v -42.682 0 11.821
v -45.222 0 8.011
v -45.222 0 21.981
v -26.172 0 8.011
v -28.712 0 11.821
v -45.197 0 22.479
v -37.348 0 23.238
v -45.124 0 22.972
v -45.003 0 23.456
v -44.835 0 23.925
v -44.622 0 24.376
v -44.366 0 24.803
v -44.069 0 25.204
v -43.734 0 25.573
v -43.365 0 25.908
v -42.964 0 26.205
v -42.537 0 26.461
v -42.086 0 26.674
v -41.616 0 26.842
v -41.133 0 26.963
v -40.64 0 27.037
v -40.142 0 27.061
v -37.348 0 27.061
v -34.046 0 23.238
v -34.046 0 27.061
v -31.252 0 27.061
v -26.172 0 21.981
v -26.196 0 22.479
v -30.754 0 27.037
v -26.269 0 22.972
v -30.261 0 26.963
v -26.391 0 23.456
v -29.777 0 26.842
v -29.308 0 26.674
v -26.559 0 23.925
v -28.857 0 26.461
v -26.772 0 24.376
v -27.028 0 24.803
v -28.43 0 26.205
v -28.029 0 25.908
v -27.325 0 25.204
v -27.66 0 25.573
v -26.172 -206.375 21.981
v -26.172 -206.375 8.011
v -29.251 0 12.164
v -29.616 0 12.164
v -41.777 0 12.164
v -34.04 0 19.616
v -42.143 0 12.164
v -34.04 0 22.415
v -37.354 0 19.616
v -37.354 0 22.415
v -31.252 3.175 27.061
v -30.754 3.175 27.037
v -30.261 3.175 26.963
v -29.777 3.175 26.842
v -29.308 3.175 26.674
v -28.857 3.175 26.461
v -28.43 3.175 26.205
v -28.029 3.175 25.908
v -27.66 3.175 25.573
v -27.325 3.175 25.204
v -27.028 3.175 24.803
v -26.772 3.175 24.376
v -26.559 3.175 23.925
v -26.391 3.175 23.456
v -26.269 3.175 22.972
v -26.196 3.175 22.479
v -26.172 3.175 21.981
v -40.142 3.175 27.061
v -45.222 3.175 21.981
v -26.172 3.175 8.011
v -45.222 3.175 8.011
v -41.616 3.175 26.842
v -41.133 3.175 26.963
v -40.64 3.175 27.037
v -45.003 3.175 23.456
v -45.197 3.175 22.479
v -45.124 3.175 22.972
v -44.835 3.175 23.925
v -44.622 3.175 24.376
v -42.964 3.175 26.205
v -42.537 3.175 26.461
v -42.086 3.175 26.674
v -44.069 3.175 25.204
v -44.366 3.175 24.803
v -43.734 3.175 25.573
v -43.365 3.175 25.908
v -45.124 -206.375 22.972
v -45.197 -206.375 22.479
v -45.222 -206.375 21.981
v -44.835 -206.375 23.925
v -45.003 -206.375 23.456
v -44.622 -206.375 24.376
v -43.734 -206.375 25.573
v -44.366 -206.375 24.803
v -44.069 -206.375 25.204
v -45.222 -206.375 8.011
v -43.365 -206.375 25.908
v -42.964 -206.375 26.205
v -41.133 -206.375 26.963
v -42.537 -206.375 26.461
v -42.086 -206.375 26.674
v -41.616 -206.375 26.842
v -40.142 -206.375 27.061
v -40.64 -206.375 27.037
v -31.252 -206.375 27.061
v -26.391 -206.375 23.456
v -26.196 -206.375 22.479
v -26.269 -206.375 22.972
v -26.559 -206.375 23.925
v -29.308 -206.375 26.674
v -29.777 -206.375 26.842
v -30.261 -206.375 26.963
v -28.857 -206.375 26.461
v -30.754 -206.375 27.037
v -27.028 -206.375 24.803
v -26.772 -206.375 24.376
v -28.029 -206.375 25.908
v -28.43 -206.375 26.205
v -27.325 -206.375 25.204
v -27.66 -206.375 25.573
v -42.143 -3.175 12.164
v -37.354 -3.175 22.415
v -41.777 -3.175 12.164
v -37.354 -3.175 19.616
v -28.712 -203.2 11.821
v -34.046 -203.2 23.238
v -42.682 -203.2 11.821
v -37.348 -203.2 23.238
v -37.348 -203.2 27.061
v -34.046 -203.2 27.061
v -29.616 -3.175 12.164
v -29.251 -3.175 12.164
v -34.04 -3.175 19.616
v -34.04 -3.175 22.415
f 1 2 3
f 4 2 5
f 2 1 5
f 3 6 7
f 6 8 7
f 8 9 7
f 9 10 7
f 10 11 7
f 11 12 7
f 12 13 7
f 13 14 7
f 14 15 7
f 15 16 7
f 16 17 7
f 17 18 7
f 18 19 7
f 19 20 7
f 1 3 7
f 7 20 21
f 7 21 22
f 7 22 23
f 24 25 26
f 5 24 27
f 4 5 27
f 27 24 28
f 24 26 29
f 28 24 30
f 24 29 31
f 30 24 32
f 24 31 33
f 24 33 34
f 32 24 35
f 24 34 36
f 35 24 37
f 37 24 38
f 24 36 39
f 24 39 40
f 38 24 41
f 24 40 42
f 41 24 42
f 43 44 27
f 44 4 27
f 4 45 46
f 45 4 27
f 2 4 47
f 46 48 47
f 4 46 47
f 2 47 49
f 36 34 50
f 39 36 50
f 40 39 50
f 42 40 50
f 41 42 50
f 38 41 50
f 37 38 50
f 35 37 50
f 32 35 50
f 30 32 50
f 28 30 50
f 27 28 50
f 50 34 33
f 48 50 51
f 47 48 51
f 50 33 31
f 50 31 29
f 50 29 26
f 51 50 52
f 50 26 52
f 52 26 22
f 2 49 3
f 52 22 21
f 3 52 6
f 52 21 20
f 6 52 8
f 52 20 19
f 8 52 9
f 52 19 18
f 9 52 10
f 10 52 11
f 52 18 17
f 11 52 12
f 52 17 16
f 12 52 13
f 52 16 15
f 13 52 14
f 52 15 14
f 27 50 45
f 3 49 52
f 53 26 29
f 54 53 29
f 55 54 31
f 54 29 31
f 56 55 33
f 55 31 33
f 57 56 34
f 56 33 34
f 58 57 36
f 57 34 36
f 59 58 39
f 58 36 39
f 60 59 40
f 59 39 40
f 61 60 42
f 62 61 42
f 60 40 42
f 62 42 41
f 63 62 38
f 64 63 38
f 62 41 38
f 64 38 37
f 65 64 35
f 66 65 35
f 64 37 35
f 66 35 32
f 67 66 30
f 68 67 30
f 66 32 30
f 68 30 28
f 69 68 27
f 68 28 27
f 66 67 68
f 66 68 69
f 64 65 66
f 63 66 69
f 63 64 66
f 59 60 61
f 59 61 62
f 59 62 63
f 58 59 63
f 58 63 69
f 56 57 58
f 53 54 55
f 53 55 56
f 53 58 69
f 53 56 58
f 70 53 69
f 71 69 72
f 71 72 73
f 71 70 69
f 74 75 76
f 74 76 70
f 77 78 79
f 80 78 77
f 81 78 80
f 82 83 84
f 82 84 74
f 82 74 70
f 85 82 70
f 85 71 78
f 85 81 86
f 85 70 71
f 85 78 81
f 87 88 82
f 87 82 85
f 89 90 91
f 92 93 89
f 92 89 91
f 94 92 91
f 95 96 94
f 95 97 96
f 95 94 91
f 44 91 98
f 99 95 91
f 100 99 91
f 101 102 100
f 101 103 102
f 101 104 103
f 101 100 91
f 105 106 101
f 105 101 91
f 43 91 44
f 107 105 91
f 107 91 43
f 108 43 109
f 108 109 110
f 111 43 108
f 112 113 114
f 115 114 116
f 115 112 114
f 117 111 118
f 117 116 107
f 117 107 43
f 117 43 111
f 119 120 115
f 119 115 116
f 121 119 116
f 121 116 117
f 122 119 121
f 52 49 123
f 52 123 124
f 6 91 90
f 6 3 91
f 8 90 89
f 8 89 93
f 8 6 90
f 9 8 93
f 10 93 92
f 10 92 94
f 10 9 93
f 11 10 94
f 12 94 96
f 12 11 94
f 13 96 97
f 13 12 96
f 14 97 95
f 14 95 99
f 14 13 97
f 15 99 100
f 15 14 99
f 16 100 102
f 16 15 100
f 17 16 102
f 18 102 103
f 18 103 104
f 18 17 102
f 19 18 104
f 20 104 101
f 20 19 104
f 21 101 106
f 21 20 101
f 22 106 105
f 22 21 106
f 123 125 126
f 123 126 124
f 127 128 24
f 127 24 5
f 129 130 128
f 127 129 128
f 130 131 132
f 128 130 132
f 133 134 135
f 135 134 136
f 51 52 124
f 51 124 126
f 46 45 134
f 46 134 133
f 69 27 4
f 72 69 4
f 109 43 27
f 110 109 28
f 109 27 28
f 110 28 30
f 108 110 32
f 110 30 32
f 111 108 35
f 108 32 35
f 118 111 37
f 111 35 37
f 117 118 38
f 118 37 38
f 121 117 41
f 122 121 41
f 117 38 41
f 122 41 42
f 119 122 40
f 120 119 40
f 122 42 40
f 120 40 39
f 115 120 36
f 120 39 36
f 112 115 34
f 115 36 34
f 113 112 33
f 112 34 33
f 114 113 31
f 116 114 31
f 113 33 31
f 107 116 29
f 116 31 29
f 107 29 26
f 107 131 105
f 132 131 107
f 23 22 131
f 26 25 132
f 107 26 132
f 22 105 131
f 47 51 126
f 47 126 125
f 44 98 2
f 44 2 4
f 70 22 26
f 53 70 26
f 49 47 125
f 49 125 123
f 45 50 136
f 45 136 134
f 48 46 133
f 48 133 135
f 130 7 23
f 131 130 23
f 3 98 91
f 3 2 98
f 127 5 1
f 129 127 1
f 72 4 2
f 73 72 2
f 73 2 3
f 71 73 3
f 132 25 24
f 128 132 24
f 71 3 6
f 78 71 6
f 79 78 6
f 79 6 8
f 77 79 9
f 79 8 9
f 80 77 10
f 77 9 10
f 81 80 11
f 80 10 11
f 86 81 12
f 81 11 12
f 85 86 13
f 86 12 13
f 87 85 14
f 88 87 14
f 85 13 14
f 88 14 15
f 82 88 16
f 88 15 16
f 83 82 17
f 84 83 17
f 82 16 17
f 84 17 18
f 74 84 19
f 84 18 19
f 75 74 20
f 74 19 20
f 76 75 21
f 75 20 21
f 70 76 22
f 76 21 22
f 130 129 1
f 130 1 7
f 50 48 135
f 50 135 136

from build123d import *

# Parameters (mm, degrees)
F1_DEPTH = 203.2
F2_W     = 19.05
F2_H     = 19.05
F3_DEPTH = 3.175
F4_R     = 5.08
F5_W     = 3.302
F5_H     = 3.823372
F6_DEPTH = 3.175
F8_DEPTH = 6.35


with BuildPart() as f1:
    # F0 (on Front) → F1 (new body)
    with BuildSketch(Plane.XZ):
        Polygon((-37.347843, 27.060995), (-45.221843, 27.060995), (-45.221843, 8.010995), (-26.171843, 8.010995), (-26.171843, 27.060995), (-34.045843, 27.060995), (-34.045843, 23.237623), (-28.711843, 11.820995), (-42.681843, 11.820995), (-37.347843, 23.237623), align=None)
    extrude(amount=F1_DEPTH)

    # F2 (on face) → F3 (join)
    with BuildSketch(Plane.XZ.offset(203.2)):
        with Locations((-35.696843, 17.535995)):
            Rectangle(F2_W, F2_H)
    extrude(amount=F3_DEPTH)

    # F4
    f4_edges = [f1.edges().sort_by_distance(p)[0] for p in [
        (-45.221843, -103.1875, 27.060995),
        (-26.171843, -103.1875, 27.060995),
    ]]
    fillet(f4_edges, radius=F4_R)


with BuildPart() as f6:
    # F5 (on face) → F6 (new body)
    with BuildSketch(Plane(origin=(0, 0, 0), x_dir=(-1, 0, 0), z_dir=(0, 1, 0))):
        with BuildLine():
            Line((42.681843, 11.820995), (28.711843, 11.820995))
            Line((28.711843, 11.820995), (34.045843, 23.237623))
            Line((34.045843, 23.237623), (34.045843, 27.060995))
            Line((34.045843, 27.060995), (31.251843, 27.060995))
            ThreePointArc((31.251843, 27.060995), (27.65974, 25.573098), (26.171843, 21.980995))
            Line((26.171843, 21.980995), (26.171843, 8.010995))
            Line((26.171843, 8.010995), (45.221843, 8.010995))
            Line((45.221843, 8.010995), (45.221843, 21.980995))
            ThreePointArc((45.221843, 21.980995), (43.733945, 25.573098), (40.141843, 27.060995))
            Line((40.141843, 27.060995), (37.347843, 27.060995))
            Line((37.347843, 27.060995), (37.347843, 23.237623))
            Line((37.347843, 23.237623), (42.681843, 11.820995))
        make_face()
        Polygon((34.045843, 23.237623), (28.711843, 11.820995), (42.681843, 11.820995), (37.347843, 23.237623), align=None)
        with Locations((35.696843, 25.149309)):
            Rectangle(F5_W, F5_H)
    extrude(amount=F6_DEPTH)

    # F7 (on face) → F8 (join)
    with BuildSketch(Plane(origin=(0, 3.175, 0), x_dir=(-1, 0, 0), z_dir=(0, 1, 0))):
        Polygon((37.353876, 19.615583), (41.777253, 12.163895), (42.143156, 12.163895), (37.353876, 22.41463), align=None)
        Polygon((34.03981, 22.41463), (29.25053, 12.163895), (29.616432, 12.163895), (34.03981, 19.615583), align=None)
    extrude(amount=-F8_DEPTH)


solid = Compound([f1.part, f6.part])
